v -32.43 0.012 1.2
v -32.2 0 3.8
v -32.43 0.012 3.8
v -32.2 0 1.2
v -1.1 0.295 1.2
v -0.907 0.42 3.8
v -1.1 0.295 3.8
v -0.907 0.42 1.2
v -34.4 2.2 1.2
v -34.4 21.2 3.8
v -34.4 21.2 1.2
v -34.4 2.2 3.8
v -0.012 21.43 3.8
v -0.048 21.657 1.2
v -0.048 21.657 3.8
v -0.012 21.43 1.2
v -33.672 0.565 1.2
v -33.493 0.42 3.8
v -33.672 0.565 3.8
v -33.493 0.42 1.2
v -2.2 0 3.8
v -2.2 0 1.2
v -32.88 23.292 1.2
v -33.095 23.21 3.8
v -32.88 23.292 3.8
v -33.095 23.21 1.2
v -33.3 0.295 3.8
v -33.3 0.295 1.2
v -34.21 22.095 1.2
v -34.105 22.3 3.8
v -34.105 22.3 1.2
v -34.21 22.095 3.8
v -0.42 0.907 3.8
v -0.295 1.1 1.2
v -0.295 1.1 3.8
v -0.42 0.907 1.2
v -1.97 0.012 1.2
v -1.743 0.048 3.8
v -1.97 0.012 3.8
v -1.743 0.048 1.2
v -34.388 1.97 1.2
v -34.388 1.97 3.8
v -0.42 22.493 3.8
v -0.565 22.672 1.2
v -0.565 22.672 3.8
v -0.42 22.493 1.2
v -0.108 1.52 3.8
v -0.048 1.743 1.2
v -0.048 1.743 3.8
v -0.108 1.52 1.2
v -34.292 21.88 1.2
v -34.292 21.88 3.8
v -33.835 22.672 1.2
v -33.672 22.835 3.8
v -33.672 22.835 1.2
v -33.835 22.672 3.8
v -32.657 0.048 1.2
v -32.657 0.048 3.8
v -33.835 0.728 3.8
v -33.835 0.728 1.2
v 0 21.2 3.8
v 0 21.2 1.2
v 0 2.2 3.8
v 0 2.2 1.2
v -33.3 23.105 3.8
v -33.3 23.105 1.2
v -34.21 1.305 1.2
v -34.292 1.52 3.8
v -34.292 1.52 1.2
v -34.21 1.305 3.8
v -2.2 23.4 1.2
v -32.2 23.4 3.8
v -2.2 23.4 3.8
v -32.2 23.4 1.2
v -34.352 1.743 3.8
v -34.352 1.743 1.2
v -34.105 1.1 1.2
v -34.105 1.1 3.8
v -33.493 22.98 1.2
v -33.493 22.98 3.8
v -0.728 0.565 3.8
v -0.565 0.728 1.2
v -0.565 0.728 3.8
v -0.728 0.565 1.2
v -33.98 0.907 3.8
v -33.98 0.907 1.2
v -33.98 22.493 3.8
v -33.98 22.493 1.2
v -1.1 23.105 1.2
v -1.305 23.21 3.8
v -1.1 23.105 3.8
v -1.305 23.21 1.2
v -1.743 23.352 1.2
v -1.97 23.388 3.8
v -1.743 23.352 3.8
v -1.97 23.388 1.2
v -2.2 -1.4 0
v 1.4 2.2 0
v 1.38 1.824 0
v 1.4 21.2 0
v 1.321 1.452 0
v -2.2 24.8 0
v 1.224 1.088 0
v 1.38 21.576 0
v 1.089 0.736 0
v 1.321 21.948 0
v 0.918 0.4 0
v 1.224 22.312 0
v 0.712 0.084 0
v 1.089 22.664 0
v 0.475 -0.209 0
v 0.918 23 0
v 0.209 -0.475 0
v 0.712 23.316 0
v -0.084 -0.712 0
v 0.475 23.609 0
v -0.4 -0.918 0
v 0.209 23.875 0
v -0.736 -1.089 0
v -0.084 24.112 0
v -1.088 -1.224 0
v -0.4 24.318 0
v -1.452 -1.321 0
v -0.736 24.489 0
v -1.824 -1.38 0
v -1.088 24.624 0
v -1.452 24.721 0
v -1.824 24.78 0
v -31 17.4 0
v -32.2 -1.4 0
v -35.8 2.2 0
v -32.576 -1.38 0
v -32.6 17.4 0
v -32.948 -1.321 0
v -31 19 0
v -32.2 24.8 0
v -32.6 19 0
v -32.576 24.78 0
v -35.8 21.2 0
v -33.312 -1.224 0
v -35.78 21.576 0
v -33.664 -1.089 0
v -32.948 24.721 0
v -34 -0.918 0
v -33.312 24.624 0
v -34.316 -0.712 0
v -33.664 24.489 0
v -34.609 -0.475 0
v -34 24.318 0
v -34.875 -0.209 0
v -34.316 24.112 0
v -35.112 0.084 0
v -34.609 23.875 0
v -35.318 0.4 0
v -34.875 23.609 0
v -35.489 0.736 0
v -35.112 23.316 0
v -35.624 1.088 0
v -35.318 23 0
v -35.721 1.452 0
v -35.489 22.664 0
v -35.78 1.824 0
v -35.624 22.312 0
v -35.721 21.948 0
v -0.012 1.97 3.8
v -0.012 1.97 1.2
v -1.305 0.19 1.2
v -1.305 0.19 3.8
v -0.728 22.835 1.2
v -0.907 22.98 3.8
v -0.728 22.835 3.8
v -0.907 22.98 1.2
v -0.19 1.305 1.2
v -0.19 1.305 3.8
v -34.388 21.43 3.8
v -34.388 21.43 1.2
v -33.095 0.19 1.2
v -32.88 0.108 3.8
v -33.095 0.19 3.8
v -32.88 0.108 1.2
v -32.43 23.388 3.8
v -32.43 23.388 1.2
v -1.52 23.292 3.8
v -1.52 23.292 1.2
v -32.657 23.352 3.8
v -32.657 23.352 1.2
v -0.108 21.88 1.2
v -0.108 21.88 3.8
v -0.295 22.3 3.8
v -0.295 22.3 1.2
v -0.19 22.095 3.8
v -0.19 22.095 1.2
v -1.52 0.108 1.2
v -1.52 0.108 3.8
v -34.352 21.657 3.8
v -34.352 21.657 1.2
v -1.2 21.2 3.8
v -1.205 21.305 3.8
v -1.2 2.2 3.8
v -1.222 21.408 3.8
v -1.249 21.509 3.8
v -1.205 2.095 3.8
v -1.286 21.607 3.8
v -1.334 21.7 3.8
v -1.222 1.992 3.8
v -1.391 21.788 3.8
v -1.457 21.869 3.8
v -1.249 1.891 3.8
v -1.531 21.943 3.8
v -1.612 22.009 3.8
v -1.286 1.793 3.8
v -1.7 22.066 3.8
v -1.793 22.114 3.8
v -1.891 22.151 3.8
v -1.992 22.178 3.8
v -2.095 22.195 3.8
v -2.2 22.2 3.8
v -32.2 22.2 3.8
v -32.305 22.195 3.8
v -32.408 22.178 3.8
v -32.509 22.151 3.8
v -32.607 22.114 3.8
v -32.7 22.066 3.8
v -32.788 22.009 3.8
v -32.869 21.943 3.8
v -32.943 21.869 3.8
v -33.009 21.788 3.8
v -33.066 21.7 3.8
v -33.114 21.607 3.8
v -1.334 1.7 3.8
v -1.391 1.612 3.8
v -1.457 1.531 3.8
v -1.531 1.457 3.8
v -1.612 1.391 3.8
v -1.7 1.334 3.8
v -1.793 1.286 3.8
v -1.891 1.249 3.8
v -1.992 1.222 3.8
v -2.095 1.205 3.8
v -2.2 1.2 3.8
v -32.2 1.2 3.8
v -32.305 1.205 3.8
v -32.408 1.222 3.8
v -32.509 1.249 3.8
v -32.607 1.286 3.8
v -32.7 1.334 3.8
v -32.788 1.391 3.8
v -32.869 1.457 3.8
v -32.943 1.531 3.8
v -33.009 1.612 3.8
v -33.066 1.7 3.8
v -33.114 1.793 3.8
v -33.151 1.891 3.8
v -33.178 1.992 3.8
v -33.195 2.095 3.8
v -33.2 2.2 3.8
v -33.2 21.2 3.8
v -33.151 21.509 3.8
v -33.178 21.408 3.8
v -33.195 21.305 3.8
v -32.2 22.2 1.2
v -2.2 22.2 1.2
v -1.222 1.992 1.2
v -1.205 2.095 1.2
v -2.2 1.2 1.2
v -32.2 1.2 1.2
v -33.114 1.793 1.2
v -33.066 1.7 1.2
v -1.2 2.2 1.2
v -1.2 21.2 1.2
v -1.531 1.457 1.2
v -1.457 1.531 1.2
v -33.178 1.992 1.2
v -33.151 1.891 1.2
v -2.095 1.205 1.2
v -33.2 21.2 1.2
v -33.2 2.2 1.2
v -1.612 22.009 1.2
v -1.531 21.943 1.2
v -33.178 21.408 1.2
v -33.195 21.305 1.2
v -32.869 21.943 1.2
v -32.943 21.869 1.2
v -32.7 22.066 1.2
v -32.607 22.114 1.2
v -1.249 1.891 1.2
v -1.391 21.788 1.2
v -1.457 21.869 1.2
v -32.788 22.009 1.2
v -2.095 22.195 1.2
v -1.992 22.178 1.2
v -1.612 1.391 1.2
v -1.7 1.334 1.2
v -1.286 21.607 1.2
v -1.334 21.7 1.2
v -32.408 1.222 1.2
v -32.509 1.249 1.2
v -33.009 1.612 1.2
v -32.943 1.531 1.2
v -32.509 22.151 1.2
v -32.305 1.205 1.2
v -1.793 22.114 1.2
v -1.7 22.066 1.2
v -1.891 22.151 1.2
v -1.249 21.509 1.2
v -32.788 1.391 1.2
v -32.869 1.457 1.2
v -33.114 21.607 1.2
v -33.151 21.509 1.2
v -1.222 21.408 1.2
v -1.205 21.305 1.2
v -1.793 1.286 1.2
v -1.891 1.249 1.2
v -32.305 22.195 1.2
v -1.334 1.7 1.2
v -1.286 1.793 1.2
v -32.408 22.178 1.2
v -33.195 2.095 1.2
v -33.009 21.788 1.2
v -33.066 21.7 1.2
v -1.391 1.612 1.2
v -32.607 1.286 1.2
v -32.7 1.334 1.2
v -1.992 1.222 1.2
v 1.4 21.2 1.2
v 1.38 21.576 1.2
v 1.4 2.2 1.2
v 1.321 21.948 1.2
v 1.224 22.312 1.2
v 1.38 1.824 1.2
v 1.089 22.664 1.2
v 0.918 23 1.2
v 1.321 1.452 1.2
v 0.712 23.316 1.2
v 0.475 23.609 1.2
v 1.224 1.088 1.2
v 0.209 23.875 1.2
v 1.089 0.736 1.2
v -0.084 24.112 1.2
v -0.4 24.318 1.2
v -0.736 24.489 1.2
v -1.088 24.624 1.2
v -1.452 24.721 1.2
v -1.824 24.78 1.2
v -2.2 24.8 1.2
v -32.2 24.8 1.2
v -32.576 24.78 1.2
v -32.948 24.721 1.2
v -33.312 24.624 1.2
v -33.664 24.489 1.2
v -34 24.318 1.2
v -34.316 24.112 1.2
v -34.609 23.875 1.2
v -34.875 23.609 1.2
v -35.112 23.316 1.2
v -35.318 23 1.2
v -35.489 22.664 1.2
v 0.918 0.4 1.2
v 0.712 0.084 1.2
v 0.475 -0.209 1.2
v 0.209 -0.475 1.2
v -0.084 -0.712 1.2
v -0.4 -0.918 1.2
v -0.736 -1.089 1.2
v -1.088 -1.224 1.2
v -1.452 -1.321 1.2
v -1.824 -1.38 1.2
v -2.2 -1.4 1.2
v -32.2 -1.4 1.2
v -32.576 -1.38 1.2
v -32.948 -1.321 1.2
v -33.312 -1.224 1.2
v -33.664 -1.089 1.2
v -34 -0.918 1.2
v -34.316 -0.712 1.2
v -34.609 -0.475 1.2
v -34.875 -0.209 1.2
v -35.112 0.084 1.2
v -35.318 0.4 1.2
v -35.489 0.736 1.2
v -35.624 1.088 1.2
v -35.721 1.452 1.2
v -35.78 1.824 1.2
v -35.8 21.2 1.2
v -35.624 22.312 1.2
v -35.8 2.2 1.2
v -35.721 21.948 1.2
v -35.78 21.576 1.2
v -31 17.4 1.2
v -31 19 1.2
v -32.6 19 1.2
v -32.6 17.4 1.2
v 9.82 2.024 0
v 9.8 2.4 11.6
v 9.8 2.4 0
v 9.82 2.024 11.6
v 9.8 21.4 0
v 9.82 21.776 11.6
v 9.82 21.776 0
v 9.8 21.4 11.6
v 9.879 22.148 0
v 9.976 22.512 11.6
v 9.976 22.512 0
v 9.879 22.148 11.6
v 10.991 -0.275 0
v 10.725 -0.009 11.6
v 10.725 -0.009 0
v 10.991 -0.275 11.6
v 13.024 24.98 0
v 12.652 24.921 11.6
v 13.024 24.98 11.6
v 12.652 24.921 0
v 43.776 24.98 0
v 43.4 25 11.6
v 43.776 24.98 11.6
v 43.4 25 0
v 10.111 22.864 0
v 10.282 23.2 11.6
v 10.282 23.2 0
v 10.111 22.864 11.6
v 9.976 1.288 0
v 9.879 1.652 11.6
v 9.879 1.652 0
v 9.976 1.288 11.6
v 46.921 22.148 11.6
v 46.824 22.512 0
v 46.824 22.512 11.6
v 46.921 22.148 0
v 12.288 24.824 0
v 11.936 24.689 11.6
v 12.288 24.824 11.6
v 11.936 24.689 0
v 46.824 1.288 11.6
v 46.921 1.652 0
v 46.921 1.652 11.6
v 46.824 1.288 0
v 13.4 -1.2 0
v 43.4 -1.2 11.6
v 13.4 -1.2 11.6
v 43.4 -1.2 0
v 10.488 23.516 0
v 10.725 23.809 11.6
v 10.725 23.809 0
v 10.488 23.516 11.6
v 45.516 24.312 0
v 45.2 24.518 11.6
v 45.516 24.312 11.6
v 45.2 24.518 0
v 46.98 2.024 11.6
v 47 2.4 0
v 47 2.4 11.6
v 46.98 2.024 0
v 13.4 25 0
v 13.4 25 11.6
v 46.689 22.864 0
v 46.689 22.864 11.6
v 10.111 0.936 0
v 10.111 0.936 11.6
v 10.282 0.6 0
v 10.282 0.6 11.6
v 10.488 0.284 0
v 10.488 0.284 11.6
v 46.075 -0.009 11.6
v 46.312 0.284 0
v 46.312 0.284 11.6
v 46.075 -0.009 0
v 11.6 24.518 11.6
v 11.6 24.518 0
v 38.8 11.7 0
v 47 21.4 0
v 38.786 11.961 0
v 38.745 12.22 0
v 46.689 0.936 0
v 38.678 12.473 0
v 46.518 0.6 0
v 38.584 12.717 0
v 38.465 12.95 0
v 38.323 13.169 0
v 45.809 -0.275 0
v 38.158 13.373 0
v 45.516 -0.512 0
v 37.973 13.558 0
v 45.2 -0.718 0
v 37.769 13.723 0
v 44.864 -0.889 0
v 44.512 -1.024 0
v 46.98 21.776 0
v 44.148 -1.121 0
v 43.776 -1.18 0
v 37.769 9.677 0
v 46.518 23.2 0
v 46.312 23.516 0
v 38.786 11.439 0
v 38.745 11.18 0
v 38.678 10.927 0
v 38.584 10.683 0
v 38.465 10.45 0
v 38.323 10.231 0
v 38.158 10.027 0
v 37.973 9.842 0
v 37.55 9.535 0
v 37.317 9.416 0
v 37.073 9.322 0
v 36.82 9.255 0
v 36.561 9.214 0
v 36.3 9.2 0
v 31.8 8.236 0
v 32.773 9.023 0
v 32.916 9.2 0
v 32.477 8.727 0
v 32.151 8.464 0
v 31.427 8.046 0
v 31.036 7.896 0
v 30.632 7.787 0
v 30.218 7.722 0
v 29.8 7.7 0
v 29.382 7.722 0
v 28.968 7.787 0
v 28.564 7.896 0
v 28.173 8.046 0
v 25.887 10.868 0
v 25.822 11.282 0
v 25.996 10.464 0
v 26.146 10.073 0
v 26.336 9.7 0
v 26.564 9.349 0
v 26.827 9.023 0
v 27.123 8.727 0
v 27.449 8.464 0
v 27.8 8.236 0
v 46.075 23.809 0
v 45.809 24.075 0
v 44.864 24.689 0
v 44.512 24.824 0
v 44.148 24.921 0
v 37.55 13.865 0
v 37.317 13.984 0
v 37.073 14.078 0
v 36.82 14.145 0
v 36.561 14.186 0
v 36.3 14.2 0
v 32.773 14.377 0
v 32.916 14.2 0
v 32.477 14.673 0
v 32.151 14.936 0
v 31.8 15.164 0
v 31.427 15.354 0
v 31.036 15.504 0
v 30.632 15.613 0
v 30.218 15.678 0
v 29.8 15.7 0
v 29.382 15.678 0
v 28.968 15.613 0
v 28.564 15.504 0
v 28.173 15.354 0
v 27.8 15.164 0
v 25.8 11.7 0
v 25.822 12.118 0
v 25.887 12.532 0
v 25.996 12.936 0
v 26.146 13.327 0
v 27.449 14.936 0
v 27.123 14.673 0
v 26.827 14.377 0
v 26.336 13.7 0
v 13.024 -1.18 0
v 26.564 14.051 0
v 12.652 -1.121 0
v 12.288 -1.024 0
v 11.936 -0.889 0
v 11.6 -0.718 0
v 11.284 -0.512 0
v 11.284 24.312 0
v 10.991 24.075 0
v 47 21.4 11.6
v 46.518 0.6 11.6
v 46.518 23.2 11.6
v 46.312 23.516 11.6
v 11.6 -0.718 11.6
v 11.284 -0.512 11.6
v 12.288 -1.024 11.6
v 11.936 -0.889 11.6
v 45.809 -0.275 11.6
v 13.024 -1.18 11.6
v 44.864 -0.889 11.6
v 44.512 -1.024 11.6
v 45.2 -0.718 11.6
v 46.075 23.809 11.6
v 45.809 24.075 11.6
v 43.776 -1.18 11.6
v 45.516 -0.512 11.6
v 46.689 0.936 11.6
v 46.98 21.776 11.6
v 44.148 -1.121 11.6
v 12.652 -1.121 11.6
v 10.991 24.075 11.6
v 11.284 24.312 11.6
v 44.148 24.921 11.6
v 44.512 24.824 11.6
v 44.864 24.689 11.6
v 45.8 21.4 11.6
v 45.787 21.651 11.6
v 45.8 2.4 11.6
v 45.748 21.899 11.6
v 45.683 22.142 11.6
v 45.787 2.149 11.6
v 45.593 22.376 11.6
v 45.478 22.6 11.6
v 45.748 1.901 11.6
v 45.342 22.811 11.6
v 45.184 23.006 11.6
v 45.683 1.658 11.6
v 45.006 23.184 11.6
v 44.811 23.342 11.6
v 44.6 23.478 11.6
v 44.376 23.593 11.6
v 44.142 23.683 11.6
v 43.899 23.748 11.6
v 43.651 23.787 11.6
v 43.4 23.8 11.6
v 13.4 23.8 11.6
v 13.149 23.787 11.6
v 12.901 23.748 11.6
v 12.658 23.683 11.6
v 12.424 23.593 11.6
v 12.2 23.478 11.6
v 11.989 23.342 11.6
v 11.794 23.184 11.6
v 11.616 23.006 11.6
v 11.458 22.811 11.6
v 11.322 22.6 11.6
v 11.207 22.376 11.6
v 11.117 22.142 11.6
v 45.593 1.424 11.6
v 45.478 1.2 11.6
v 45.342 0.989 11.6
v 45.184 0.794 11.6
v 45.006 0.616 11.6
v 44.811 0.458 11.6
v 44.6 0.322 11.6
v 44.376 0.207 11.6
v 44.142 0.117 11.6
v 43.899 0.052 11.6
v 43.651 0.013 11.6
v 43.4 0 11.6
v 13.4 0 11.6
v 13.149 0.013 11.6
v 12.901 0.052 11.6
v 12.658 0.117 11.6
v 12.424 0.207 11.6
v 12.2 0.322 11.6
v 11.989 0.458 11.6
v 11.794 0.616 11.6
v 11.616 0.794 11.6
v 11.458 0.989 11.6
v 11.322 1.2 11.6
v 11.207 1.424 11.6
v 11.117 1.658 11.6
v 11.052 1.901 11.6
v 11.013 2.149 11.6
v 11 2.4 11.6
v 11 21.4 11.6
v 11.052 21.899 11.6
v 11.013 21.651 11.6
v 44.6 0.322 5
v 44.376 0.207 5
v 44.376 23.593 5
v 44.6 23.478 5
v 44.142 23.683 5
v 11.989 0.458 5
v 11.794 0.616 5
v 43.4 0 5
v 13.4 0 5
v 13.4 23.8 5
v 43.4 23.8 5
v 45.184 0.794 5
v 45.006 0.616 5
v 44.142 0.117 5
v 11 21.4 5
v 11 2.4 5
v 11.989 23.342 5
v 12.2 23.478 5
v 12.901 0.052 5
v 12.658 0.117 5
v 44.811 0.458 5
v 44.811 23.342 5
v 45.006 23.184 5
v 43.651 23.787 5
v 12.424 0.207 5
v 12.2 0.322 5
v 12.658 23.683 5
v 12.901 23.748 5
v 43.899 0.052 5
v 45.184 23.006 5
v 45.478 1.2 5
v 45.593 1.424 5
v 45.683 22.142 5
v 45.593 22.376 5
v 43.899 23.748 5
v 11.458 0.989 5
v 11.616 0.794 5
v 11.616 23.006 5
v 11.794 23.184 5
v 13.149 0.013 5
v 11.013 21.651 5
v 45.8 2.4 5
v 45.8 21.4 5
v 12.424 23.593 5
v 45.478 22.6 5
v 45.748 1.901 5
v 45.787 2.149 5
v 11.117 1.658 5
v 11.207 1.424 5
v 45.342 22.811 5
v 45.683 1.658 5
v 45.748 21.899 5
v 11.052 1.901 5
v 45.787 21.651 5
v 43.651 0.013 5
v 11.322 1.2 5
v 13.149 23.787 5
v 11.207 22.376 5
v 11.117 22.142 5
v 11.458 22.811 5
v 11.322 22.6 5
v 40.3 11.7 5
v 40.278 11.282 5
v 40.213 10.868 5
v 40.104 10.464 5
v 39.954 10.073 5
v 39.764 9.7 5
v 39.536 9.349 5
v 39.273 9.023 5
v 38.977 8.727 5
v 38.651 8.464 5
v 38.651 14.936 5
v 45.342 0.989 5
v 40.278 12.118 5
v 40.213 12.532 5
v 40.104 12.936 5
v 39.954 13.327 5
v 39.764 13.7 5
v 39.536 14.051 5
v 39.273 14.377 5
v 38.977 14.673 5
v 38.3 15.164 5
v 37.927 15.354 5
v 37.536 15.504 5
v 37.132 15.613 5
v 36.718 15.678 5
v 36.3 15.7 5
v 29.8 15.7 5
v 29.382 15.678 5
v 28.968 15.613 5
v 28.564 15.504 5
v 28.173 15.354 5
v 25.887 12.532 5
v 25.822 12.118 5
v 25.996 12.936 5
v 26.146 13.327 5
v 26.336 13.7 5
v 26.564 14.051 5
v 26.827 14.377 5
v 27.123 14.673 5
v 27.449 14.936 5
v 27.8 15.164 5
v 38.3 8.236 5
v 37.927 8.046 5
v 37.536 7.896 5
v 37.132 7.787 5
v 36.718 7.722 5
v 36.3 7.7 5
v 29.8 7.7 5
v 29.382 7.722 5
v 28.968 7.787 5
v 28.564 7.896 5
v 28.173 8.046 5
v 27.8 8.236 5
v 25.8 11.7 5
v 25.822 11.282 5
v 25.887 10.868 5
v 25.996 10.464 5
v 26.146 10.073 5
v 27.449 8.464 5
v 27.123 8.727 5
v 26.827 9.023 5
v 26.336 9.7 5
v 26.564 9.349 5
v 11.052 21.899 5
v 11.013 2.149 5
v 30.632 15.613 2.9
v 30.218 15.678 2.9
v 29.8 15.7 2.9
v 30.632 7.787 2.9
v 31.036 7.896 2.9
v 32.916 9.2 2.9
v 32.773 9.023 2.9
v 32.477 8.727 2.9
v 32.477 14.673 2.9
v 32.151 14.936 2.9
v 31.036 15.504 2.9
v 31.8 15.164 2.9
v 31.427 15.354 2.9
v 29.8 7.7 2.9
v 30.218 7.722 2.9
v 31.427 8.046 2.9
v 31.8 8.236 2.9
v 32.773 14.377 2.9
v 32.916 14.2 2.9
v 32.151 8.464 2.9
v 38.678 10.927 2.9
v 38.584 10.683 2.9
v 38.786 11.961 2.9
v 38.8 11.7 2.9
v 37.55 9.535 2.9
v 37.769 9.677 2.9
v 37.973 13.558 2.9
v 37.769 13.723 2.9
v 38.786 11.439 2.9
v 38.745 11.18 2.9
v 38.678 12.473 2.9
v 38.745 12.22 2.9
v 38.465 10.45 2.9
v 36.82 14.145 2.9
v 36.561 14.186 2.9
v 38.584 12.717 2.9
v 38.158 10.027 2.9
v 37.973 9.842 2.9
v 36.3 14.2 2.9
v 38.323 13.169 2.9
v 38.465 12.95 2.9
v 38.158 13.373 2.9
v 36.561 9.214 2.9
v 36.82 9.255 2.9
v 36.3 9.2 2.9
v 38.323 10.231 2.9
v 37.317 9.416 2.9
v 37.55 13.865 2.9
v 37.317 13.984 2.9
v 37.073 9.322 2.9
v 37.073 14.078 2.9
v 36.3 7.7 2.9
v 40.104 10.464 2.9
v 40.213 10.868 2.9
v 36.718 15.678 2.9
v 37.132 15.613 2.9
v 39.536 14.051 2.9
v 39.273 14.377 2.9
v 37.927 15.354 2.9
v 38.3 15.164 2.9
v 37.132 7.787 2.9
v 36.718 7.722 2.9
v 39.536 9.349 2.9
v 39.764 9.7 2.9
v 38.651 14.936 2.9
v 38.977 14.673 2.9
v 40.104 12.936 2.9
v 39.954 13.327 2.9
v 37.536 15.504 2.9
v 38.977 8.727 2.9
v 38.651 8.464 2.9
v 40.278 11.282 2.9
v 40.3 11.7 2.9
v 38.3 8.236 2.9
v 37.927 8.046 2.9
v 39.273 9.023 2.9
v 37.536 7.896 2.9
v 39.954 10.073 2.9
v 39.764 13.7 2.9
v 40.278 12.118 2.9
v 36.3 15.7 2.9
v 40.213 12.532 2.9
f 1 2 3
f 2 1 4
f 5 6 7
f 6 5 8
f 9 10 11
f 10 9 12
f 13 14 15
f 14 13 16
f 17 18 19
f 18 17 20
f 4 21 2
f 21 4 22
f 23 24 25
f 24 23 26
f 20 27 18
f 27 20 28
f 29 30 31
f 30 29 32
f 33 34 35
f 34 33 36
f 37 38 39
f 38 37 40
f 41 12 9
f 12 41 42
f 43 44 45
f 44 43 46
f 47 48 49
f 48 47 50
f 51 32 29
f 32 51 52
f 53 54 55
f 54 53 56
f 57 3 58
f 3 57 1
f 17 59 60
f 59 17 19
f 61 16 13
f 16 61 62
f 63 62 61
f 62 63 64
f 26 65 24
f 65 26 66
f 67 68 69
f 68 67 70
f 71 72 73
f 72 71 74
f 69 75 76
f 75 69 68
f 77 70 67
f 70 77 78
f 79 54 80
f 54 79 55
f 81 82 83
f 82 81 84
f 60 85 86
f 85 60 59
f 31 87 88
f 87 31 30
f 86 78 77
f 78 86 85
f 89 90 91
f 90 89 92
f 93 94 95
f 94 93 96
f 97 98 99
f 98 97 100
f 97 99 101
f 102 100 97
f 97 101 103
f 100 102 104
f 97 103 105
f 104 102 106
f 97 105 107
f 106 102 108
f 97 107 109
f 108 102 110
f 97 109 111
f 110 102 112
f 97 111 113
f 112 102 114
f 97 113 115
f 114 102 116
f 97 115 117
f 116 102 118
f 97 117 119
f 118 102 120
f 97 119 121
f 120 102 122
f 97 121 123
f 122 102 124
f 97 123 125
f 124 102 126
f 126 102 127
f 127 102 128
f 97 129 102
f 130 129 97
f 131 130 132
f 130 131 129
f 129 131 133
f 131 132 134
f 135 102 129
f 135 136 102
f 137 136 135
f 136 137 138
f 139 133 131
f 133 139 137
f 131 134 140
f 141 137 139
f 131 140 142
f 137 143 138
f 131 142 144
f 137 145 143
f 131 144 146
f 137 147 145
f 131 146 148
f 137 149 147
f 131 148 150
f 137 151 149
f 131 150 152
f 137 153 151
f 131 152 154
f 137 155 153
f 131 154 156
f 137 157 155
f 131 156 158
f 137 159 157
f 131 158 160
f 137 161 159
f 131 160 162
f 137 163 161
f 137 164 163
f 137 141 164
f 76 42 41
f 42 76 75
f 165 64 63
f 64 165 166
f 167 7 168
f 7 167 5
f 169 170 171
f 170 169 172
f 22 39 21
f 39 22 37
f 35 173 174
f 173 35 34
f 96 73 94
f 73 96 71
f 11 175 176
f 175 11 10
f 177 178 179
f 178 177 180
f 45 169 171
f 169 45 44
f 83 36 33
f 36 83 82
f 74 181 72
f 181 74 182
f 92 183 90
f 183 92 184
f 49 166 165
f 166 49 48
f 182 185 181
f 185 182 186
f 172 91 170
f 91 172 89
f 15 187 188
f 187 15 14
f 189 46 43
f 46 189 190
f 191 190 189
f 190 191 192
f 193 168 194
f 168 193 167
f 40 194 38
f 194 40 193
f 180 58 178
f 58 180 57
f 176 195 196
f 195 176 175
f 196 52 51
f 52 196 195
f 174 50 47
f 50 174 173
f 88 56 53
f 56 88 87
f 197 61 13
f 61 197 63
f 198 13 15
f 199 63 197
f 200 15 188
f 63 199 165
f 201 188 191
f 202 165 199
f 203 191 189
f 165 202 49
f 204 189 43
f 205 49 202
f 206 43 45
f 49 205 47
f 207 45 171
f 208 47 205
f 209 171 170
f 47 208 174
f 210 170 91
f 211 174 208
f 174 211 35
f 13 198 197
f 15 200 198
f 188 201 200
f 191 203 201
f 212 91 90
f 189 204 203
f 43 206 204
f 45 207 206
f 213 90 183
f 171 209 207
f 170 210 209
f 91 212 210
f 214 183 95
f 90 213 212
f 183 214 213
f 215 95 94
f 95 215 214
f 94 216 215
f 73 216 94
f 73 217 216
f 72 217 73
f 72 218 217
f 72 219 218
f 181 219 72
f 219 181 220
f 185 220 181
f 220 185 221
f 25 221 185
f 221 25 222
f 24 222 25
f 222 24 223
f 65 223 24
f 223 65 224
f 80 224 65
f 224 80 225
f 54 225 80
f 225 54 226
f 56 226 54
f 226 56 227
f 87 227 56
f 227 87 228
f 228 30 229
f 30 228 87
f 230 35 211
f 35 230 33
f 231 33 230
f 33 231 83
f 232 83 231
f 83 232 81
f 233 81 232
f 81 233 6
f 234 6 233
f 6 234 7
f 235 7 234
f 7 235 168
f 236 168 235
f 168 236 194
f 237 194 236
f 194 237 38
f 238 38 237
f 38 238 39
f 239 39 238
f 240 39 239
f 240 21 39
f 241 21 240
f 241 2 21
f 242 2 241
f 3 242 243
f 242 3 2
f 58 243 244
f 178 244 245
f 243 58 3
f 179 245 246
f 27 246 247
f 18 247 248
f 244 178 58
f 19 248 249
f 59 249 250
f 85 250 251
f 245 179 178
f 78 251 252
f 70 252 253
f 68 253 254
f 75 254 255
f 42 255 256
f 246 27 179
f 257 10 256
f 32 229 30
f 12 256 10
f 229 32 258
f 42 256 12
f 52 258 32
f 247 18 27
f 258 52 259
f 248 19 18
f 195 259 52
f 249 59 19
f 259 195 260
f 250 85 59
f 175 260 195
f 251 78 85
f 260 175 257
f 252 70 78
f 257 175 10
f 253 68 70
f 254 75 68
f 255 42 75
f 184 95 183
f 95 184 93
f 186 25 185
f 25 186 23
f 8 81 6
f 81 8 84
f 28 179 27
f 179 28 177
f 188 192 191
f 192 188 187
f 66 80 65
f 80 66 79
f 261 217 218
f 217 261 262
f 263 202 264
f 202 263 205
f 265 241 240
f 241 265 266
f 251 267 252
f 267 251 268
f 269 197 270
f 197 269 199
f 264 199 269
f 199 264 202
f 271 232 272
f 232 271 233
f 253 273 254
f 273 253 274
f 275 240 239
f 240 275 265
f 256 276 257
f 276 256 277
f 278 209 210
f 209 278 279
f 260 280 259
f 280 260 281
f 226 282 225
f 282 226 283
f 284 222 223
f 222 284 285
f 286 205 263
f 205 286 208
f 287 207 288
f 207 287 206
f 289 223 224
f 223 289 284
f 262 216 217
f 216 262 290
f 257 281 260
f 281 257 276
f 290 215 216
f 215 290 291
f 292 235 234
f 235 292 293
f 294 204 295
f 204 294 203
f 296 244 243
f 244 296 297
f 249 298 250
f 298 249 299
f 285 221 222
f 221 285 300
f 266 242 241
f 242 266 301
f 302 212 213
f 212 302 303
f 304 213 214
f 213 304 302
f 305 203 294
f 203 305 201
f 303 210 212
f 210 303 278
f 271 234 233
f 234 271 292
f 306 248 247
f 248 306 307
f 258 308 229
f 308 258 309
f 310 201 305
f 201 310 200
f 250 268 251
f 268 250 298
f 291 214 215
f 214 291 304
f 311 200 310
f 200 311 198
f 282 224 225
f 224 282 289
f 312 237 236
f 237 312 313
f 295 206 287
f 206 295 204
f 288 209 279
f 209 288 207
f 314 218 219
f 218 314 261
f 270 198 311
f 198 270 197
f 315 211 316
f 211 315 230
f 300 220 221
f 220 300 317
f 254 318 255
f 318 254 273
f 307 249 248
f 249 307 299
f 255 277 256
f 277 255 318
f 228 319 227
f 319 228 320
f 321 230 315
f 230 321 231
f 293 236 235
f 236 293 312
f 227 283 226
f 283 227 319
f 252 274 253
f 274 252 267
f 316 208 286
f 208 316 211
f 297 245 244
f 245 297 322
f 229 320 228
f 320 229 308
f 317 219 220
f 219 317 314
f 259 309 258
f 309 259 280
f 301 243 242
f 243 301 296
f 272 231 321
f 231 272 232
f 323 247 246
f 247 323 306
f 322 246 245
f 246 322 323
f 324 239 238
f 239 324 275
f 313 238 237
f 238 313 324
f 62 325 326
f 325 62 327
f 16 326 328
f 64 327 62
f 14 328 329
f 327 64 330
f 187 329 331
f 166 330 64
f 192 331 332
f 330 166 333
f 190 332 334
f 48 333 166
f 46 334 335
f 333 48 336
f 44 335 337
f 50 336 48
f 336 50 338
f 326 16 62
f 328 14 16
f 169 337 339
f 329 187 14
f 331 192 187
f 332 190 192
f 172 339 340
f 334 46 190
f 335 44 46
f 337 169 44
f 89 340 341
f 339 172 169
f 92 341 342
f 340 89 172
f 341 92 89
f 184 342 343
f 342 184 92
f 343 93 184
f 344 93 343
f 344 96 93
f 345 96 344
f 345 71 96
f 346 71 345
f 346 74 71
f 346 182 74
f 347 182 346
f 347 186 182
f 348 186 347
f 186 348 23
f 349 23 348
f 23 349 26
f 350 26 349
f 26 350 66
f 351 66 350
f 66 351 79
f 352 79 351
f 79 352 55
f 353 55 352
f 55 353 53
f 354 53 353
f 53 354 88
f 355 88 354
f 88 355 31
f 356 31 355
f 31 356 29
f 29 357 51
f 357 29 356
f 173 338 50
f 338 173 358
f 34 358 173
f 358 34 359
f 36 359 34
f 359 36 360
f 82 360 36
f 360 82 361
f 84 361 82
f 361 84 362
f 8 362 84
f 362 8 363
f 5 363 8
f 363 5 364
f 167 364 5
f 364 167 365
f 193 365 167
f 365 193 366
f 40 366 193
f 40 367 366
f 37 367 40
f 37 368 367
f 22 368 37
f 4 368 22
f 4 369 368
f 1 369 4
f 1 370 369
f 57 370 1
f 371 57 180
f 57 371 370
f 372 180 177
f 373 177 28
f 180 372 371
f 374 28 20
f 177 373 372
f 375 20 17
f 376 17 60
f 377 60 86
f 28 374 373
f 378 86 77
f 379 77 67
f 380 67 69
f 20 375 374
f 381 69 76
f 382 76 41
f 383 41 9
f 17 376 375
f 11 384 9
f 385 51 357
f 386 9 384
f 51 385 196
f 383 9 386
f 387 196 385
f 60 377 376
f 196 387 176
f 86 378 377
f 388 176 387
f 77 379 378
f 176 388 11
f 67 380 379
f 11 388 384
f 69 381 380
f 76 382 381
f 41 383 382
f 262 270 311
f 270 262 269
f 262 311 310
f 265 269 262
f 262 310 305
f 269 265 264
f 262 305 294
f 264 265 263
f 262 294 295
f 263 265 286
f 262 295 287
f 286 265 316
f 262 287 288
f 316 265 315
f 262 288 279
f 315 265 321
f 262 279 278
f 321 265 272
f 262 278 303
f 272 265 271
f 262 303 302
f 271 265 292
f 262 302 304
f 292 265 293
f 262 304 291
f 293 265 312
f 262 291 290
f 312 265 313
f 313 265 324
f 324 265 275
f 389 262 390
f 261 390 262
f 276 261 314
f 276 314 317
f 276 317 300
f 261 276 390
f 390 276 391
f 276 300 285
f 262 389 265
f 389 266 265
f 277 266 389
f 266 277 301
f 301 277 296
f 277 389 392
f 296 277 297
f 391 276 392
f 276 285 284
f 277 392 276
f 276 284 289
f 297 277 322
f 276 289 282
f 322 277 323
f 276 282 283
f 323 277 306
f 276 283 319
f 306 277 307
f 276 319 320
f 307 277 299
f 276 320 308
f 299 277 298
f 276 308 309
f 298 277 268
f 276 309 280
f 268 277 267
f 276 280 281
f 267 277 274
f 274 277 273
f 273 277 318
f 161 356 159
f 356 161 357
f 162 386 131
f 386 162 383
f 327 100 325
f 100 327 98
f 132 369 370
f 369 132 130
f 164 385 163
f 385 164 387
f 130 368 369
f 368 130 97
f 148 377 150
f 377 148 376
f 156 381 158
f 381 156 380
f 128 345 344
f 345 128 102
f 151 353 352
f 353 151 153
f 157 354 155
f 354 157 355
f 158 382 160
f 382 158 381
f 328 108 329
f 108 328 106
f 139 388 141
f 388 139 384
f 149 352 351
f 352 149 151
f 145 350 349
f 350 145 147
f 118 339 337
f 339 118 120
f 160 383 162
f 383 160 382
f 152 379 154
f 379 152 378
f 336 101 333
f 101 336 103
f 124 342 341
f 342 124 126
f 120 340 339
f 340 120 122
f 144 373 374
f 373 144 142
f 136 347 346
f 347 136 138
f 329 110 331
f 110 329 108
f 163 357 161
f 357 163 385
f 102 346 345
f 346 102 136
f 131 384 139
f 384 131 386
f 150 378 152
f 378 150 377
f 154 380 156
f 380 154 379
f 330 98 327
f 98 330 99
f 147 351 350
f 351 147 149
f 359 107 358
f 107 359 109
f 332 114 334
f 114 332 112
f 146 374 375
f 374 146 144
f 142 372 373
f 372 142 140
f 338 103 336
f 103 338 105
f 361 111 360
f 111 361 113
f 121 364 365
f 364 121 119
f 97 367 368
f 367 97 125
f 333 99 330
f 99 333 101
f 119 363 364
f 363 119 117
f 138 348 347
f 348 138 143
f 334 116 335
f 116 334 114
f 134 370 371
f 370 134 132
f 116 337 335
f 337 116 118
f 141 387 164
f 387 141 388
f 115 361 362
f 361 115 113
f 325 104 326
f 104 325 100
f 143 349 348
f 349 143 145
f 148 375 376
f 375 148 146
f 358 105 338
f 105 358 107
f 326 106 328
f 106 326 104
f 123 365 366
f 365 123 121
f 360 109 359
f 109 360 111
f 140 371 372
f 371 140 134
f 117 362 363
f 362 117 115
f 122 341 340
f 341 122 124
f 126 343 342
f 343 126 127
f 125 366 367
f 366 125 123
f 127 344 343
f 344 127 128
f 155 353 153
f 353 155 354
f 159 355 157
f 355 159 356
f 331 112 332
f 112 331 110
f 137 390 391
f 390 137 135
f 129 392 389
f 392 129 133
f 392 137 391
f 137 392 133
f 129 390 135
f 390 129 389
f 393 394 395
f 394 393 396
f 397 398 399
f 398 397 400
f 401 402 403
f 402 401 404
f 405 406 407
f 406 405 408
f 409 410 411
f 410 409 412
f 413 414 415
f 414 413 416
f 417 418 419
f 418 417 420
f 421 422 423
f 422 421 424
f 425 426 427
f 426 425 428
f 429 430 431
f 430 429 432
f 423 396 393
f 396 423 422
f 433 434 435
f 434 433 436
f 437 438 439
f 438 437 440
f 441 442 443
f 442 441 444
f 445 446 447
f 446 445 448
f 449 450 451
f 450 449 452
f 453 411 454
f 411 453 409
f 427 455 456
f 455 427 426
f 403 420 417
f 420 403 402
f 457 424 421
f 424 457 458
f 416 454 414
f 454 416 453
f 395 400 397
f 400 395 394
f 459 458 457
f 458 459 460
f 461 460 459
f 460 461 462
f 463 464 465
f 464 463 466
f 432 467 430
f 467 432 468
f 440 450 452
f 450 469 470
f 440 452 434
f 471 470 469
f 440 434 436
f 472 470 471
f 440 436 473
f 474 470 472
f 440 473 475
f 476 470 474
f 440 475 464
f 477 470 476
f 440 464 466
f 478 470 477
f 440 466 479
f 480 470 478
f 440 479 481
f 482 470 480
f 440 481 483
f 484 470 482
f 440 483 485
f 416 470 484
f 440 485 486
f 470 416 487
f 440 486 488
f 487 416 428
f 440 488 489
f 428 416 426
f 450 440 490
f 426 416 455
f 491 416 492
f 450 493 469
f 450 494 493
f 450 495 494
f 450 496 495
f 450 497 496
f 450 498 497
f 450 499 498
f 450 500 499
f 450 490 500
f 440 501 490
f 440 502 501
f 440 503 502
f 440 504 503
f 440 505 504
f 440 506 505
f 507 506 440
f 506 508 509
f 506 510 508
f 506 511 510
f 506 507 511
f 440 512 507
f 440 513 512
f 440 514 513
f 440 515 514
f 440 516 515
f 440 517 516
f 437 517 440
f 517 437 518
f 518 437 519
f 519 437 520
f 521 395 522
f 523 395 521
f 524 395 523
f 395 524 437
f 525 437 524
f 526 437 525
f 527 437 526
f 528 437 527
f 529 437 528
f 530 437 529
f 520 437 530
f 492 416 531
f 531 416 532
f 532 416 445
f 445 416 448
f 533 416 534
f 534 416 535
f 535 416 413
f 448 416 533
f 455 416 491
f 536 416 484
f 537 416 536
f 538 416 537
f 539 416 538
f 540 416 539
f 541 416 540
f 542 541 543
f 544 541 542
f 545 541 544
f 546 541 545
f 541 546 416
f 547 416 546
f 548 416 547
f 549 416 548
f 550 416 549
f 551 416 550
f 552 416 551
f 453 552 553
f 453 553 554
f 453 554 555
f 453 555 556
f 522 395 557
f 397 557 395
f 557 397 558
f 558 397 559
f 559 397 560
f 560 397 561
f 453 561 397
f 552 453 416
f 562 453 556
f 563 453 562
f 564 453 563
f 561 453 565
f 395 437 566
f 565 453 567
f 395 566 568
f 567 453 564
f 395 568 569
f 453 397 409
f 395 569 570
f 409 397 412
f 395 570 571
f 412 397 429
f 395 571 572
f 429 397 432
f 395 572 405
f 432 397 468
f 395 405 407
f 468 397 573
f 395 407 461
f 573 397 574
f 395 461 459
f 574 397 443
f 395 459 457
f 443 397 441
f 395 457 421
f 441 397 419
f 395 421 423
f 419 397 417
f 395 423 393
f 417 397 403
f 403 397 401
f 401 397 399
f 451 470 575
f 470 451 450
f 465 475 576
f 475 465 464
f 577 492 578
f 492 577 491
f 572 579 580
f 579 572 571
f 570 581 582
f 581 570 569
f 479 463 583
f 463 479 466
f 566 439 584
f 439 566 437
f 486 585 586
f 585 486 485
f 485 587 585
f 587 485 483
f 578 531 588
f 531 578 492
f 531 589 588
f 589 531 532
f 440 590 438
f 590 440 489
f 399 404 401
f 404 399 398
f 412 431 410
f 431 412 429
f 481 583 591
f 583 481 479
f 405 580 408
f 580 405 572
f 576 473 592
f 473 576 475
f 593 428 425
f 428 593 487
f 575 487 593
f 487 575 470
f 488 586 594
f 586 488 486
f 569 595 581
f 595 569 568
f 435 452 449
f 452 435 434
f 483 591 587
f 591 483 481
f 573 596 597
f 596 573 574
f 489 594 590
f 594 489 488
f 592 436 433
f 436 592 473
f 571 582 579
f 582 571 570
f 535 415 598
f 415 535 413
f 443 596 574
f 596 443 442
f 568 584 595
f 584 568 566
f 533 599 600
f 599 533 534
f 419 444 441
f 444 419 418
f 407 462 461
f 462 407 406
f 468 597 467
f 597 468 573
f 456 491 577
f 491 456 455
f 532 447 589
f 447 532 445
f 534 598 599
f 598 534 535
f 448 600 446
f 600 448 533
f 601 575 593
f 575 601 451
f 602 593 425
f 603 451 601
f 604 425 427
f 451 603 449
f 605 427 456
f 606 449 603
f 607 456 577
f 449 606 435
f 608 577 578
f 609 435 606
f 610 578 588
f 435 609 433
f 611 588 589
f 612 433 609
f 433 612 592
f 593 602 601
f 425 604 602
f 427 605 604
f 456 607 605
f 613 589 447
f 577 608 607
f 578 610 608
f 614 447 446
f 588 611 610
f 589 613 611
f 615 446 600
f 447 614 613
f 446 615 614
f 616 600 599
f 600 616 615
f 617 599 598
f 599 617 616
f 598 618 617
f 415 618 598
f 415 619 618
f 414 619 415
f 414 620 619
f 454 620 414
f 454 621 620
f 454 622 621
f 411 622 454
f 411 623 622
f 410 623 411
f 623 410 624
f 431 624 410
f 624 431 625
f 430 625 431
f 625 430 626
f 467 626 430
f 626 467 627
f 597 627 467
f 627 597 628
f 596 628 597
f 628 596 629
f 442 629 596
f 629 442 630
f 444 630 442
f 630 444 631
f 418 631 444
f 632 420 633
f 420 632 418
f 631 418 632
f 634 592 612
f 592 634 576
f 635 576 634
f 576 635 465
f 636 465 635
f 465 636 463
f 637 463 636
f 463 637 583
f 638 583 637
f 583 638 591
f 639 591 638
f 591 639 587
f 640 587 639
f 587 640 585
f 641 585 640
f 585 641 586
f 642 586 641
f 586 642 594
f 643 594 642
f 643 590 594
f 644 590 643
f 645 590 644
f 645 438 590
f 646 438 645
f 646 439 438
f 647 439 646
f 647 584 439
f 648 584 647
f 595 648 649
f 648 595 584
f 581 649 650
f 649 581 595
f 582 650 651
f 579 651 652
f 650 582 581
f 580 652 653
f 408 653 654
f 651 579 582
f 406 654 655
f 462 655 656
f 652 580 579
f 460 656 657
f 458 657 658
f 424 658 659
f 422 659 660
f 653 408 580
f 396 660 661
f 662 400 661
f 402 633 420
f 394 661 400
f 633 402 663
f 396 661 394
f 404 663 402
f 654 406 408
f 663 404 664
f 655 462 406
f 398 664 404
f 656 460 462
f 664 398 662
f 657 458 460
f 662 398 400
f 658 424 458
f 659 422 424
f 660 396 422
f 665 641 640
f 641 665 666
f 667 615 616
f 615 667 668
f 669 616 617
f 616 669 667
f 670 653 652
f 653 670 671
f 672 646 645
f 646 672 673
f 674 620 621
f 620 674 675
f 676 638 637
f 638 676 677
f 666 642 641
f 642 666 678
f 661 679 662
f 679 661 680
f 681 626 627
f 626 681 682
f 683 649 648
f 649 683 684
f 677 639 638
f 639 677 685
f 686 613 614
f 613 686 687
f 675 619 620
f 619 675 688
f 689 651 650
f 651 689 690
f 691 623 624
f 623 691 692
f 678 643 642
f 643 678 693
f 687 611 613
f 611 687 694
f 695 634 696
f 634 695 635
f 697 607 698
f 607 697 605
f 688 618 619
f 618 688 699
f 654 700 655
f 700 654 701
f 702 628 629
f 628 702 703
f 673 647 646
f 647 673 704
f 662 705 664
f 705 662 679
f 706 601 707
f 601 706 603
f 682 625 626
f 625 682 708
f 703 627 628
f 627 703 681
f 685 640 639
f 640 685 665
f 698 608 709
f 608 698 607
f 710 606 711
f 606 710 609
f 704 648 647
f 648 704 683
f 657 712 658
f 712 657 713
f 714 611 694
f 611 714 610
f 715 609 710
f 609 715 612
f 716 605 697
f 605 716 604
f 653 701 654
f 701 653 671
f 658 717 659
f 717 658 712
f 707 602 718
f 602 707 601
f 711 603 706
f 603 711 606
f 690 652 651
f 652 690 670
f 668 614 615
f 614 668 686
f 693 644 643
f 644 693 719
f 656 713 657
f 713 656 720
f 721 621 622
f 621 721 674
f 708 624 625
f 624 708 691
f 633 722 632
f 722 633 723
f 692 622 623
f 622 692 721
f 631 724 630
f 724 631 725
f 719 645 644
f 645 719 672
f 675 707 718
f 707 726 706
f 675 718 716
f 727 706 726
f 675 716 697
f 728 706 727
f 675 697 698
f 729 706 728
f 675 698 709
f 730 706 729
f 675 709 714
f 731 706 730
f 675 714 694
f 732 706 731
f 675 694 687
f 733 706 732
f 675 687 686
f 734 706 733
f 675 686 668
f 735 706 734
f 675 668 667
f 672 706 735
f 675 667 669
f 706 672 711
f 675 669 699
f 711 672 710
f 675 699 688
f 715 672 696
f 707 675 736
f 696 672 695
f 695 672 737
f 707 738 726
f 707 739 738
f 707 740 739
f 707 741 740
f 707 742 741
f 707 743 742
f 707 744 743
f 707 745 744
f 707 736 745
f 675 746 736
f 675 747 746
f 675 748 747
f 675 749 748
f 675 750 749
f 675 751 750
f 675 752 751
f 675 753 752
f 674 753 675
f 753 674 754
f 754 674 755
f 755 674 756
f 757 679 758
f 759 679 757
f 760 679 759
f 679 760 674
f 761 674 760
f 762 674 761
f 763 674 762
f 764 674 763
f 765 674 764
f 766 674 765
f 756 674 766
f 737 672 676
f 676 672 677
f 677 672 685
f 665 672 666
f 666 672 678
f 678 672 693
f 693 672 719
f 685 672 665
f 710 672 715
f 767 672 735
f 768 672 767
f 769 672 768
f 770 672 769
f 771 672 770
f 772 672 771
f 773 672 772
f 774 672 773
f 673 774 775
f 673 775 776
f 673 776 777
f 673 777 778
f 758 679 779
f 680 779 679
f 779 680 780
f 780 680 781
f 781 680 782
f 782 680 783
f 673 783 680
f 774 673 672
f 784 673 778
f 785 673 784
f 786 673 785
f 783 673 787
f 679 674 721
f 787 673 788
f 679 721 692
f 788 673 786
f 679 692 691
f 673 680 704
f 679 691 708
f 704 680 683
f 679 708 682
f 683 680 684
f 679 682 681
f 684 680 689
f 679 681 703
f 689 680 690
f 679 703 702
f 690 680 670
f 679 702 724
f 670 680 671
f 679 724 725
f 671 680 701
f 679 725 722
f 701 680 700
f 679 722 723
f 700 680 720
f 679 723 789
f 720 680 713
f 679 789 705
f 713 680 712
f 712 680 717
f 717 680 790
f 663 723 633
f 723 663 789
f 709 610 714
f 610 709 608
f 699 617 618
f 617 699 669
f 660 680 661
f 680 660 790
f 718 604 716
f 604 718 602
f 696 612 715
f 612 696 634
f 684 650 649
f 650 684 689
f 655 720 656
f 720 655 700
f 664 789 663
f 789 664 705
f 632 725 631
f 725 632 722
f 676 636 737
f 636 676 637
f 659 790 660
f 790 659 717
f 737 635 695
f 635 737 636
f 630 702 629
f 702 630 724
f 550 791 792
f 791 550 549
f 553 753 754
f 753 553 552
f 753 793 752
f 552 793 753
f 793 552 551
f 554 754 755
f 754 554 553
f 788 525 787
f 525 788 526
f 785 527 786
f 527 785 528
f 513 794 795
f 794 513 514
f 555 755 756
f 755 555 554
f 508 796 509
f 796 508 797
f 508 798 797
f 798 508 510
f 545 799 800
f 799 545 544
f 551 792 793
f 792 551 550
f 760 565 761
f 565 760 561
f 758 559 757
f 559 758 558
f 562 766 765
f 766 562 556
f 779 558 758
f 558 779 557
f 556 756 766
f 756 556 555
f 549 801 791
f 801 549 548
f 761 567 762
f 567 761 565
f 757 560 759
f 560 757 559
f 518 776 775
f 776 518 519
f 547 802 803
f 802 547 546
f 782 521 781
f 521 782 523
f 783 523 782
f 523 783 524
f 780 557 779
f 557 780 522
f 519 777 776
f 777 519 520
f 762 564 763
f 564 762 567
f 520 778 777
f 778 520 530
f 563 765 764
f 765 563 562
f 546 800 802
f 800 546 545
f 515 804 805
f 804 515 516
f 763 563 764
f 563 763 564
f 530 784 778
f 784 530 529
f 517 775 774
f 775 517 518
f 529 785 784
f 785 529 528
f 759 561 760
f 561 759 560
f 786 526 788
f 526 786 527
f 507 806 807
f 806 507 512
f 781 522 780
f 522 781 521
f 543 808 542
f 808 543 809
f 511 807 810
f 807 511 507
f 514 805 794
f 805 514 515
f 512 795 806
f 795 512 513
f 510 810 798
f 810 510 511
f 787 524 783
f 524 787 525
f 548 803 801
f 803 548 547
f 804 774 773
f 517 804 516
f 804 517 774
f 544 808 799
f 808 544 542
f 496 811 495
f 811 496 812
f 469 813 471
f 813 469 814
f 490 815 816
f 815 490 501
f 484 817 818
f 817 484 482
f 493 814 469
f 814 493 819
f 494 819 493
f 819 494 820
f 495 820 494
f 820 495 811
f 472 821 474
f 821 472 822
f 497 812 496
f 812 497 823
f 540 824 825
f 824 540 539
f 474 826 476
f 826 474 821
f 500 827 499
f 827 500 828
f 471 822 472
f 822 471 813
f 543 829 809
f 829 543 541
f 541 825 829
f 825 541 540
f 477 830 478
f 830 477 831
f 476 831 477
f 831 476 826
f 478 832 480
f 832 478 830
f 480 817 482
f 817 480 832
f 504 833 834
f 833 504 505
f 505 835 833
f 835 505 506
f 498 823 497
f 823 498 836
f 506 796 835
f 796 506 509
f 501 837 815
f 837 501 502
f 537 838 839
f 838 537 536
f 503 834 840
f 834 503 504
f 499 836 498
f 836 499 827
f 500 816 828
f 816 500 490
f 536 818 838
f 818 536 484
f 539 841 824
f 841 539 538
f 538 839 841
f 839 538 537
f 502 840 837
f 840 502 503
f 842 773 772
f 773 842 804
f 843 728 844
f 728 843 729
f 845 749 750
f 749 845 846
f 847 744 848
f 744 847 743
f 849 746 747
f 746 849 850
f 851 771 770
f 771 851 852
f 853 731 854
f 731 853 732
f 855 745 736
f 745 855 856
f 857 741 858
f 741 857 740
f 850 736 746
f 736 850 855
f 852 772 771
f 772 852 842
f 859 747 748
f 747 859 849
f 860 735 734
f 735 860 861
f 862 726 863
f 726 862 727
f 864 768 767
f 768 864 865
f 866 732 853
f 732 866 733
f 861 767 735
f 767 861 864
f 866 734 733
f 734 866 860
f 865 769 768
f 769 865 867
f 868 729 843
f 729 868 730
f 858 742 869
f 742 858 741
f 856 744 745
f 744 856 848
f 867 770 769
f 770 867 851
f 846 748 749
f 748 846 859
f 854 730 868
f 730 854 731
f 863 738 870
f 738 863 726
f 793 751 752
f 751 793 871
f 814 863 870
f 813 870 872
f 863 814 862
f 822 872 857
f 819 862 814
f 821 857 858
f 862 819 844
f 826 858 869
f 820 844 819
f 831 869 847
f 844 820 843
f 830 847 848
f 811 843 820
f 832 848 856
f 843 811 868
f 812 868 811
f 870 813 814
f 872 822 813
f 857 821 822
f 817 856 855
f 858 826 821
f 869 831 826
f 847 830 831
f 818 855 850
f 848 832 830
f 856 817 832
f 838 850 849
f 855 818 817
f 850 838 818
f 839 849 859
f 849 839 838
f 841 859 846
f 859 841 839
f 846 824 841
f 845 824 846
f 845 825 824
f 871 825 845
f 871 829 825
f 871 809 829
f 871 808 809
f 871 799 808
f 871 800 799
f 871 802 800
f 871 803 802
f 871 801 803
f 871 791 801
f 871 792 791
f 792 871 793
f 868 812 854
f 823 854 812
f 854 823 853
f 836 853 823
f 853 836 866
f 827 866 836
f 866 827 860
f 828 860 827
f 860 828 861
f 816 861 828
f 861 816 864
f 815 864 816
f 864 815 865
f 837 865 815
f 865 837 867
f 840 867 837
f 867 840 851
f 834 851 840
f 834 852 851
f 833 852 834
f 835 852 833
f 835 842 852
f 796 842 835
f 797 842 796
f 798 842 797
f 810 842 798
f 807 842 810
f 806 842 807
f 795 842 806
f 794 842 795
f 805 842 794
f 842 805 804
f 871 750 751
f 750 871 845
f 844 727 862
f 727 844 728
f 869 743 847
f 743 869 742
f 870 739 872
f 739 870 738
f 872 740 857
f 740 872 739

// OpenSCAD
/* [Size] */

// length of circuit board
length = 21;

// width of circuit board
width = 32;

// height of circuit board
height=4+2.6;

// height of battery holder
battheight = 2.6;

// corner radius
radius=1;

// fit allowance between base and lid
fit=0.2;

/* [Wall thicknesses] */
side=1.2;
bottom=1.2;
lidbottom=5;
top=0;
rim = 2;

/* [Options] */

// place magnets on outside of case
magnets = "none"; // [none:No magnets,inside:magnets inside case,outside:magnets outside case]

// hole for LED
led_hole = true;

// hole for suction cup
keyhole = true;

// include holes for programming cable
pogo=false;

// length of magnet
maglength = 20;

// height of magnet
magheight = 6;

// width of magnet
magwidth = 4.4;

// fit allowance for magnet socket
magfit = 0.4;

// suction cup keyhole size
keyhole_large = 8;
keyhole_small = 5;
keyhole_depth = 2;



/* [Hidden] */
led_inset_x=4;
led_inset_y = 7;

lidheight=height-bottom+lidbottom;

fuz=0.1; 
fuzz=2*fuz;
$fn=60;

module lozenge(l,w,h,r) {
    hull() {
        translate([r,r,0]) cylinder(r=r,h=h);
        translate([l-r,r,0]) cylinder(r=r,h=h);
        translate([l-r,w-r,0]) cylinder(r=r,h=h);
        translate([r,w-r,0]) cylinder(r=r,h=h);
    }
}

module hollow_lozenge(l,w,h,r=radius,s=side,b=bottom,t=top) {
    difference() {
	lozenge(l,w,h,r);
	translate([s,s,b]) lozenge(l-2*s,w-2*s,h-b-t,r);
    }
}

module hollow_lozenge_id(l,w,h,r,s=side,b=bottom,t=top) {
    difference() {
	lozenge(l+2*s,w+2*s,h+b+t,r+s);
	translate([s,s,b]) lozenge(l,w,h+fuzz,r);
    }
}

module base(){
// inner shell
    difference() {
        union() {
            if (magnets=="inside") {
		// magnets at end
                hollow_lozenge_id(length, width+2*magwidth+2*side, height, radius);
                translate([side+radius,side,bottom]) cube([length-2*radius,magwidth,height-battheight-bottom]);
                translate([side+radius,side+magwidth+side+width+side,bottom]) cube([length-2*radius,magwidth,height-battheight-bottom]);
                translate([0,side+magwidth,0]) cube([length+2*side,side,bottom+height]);
                translate([0,width+magwidth+2*side,0]) cube([length+2*side,side,bottom+height]);
                translate([-side-fit,-side-fit,0]) hollow_lozenge(
                    length+2*(side+fit+side), 
                    width+2*(magwidth+side+side+fit+side), 
                    rim, 
                    radius+(side+fit+side),
                    side+fit,
                    bottom
                );

            } else if (magnets=="outside") {
		// magnets at sides, outside case
                hollow_lozenge_id(length, width+2*magwidth+2*side, height, radius);
                translate([-side-fit,-side-fit,0]) hollow_lozenge(length+2*(side+fit+side), width+2*(side+fit+side), bottom, radius+(side+fit+side),2*side,bottom);
            }
	    else {
		// no magnets
                hollow_lozenge_id(length, width, battheight, radius);
	    }

	    // base to provide seal against lid
            translate([-side-fit,-side-fit,0]) hollow_lozenge(length+2*(side+fit+side), width+2*(side+fit+side), bottom, radius+(side+fit+side),2*side,bottom);
        }
        if (led_hole) {
            translate([side+length-led_inset_x,side+magwidth+side+width-led_inset_y,bottom/2]) cube([1.6,1.6,2*bottom+2*fuzz],center=true);
        }
	if (magnets == "inside") {
	    // cut out to allow lifting the PCB
	    translate([-fuzz,side+magwidth+side,bottom+battheight]) cube([length+2*side+2*fuzz,width,height-battheight+fuzz]);
	}
        
        if (pogo) {
            translate([side+length-4,side+1,-fuzz]) {
                for (i=[0:5]) {
                    translate([-2*i,0,0]) cylinder(d=1,h=2*bottom+2*fuzz);
                }
            }
        }
        
    }
}

module vertical_text(t, size) {
     rotate([90,180,0]) {
          linear_extrude(height=0.8) {
               text(text=t,
                    size = size,
                    //font = "Verdana:style=Bold"
                    font = "Avenir Next Condensed:style=Demi Bold"
                 );
          }    
     }
}

module magbox() {
    difference() {
	cube([maglength+magfit+2*side, magwidth+magfit+2*side, magheight+bottom]);
	translate([side,side,-fuzz]) cube([maglength+magfit,magwidth+magfit,magheight+fuzz]);
    }
}

module lid() {
    difference() {
        union() {
    // outer shell
        if (magnets=="outside") {
            hollow_lozenge_id(l=length+2*(side+fit),w=width+2*(side+fit),h=lidheight,r=radius+(side+fit),b=lidbottom);
        } else if (magnets=="inside") {
            hollow_lozenge_id(l=length+2*(side+fit),w=width+2*(side+magwidth)+2*(side+fit),h=lidheight,r=radius+(side+fit),b=lidbottom);
        } else {
	    ll = length+2*(side+fit);
	    lw = width+2*(side+fit);
	    echo (ll=ll,lw=lw,height=height,side=side,bottom=bottom,lidbottom=lidbottom,lidheight=lidheight);
	    	
            hollow_lozenge_id(l=ll,w=lw,h=height,r=radius+(side+fit),b=lidbottom);
        }
       
        if (magnets=="outside") {
            overlap = 1;
            translate([side,lidwidth_outer/2-12,0]) rotate([0,0,90]) magbox();
            translate([lidlength_outer-overlap,lidwidth_outer/2-12,0]) rotate([0,0,90]) scale([1,-1,1]) magbox();
        }
        //translate([-2,lidwidth_outer/2-12,0]) cube([2+overlap,2,lidheight]);
        //translate([-2,lidwidth_outer/2+10,0]) cube([2+overlap,2,lidheight]);
        //translate([lidlength_outer-overlap,lidwidth_outer/2-12,0]) cube([2+overlap,2,lidheight]);
        //translate([lidlength_outer-overlap,lidwidth_outer/2+10,0]) cube([2+overlap,2,lidheight]);

        //translate([width-3,0,7]) vertical_text(" f742d1",5);
    }
    if (keyhole) {
           translate([2*side+length/2,side+width/2,-fuz]) {
                cylinder(d=keyhole_large, h=lidbottom+fuzz);
		hull() {
		    cylinder(d=keyhole_small, h=lidbottom+fuzz);
		    translate([0,-keyhole_large/2-keyhole_small/2,0]) cylinder(d=keyhole_small, h=lidbottom+fuzz);
		}
		translate([0,0,3]) 
		hull() {
		    cylinder(d=keyhole_large, h=lidbottom-3+fuzz);
		    translate([0,-keyhole_large/2-keyhole_small/2,0]) cylinder(d=keyhole_large, h=lidbottom-3+fuzz);
		}
            }
        }

    }
}


rotate([0,0,90]) base();
translate([2*length+5,-side,0]) rotate([0,0,90]) lid();
